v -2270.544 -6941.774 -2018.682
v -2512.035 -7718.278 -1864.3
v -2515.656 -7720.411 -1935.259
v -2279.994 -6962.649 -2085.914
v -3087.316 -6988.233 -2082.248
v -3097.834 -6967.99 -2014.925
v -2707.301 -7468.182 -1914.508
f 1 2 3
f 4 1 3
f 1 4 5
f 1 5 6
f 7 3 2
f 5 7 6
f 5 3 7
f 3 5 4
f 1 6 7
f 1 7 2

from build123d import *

# Parameters (mm, degrees)
BOSS_EXTRUDE1_DEPTH = 70
CHAMFER1_SIZE2      = 4.18941816
CHAMFER1_SIZE       = 70
CHAMFER2_SIZE       = 7.017777763
CHAMFER2_SIZE_2     = 70


# Some blends are built 0.0001 mm under size
with BuildPart() as part:
    # Sketch1 → Boss-Extrude1 (new body)
    with BuildSketch(Plane(origin=(5.473822054, -457.937984789, -3307.31325441), x_dir=(-0.9856470342360776, 0.16521656475401902, -0.03469020946183102), z_dir=(-0.0017423663357502073, 0.19552071957465159, 0.980698023030822))):
        Polygon((1127.410622311, 6899.993028511), (1231.788289667, 7721.098906243), (1938.364522736, 7065.713670786), align=None)
    extrude(amount=-BOSS_EXTRUDE1_DEPTH)

    # Chamfer1
    chamfer1_edges = [part.edges().sort_by_distance(p)[0] for p in [
        (-2804.812562525, -7356.820333598, -2008.261086677),
    ]]
    chamfer1_side = [part.faces().sort_by_distance(p)[0] for p in [
        (-2804.812708515, -7356.803951237, -2008.178915595),
    ]]
    chamfer(chamfer1_edges, length=CHAMFER1_SIZE - 0.0001, length2=CHAMFER1_SIZE2 - 0.0001, reference=chamfer1_side[0])  # a hair under: the kernel refuses the full size

    # Chamfer2
    # the kernel refuses this chamfer: 70, 7.017777763 mm, written as the material it takes off along each edge
    with BuildSketch(Plane(origin=(-3274.435511319, -6987.276794808, -2082.770948142), x_dir=(0.030469156507814454, -0.9854547133895118, -0.1671844441331112), z_dir=(0.999487976226041, 0.031673079457915976, -0.004538878410539619))) as chamfer2_piece_1:
        Polygon((CHAMFER2_SIZE * 0.934223811245, -CHAMFER2_SIZE * 0.356687356966), (-CHAMFER2_SIZE_2 * 0.356687356946, -CHAMFER2_SIZE_2 * 0.93422381119), (0, 0), align=None)
    extrude(amount=1186.493835622, mode=Mode.SUBTRACT)
    with BuildSketch(Plane(origin=(-2217.332595505, -6784.751941859, -2121.270000408), x_dir=(0.0019280825655142314, 0.19442255260126845, 0.9809159767980269), z_dir=(-0.2917562783292002, -0.9381311781639606, 0.1865158615565802))) as chamfer2_piece_2:
        Polygon((CHAMFER2_SIZE_2 * 0.999992637165, CHAMFER2_SIZE_2 * 0.00383739696559), (-CHAMFER2_SIZE * 0.00383739696579, CHAMFER2_SIZE * 0.999992637223), (0, 0), align=None)
    extrude(amount=1186.493835622, mode=Mode.SUBTRACT)


solid = part.part
